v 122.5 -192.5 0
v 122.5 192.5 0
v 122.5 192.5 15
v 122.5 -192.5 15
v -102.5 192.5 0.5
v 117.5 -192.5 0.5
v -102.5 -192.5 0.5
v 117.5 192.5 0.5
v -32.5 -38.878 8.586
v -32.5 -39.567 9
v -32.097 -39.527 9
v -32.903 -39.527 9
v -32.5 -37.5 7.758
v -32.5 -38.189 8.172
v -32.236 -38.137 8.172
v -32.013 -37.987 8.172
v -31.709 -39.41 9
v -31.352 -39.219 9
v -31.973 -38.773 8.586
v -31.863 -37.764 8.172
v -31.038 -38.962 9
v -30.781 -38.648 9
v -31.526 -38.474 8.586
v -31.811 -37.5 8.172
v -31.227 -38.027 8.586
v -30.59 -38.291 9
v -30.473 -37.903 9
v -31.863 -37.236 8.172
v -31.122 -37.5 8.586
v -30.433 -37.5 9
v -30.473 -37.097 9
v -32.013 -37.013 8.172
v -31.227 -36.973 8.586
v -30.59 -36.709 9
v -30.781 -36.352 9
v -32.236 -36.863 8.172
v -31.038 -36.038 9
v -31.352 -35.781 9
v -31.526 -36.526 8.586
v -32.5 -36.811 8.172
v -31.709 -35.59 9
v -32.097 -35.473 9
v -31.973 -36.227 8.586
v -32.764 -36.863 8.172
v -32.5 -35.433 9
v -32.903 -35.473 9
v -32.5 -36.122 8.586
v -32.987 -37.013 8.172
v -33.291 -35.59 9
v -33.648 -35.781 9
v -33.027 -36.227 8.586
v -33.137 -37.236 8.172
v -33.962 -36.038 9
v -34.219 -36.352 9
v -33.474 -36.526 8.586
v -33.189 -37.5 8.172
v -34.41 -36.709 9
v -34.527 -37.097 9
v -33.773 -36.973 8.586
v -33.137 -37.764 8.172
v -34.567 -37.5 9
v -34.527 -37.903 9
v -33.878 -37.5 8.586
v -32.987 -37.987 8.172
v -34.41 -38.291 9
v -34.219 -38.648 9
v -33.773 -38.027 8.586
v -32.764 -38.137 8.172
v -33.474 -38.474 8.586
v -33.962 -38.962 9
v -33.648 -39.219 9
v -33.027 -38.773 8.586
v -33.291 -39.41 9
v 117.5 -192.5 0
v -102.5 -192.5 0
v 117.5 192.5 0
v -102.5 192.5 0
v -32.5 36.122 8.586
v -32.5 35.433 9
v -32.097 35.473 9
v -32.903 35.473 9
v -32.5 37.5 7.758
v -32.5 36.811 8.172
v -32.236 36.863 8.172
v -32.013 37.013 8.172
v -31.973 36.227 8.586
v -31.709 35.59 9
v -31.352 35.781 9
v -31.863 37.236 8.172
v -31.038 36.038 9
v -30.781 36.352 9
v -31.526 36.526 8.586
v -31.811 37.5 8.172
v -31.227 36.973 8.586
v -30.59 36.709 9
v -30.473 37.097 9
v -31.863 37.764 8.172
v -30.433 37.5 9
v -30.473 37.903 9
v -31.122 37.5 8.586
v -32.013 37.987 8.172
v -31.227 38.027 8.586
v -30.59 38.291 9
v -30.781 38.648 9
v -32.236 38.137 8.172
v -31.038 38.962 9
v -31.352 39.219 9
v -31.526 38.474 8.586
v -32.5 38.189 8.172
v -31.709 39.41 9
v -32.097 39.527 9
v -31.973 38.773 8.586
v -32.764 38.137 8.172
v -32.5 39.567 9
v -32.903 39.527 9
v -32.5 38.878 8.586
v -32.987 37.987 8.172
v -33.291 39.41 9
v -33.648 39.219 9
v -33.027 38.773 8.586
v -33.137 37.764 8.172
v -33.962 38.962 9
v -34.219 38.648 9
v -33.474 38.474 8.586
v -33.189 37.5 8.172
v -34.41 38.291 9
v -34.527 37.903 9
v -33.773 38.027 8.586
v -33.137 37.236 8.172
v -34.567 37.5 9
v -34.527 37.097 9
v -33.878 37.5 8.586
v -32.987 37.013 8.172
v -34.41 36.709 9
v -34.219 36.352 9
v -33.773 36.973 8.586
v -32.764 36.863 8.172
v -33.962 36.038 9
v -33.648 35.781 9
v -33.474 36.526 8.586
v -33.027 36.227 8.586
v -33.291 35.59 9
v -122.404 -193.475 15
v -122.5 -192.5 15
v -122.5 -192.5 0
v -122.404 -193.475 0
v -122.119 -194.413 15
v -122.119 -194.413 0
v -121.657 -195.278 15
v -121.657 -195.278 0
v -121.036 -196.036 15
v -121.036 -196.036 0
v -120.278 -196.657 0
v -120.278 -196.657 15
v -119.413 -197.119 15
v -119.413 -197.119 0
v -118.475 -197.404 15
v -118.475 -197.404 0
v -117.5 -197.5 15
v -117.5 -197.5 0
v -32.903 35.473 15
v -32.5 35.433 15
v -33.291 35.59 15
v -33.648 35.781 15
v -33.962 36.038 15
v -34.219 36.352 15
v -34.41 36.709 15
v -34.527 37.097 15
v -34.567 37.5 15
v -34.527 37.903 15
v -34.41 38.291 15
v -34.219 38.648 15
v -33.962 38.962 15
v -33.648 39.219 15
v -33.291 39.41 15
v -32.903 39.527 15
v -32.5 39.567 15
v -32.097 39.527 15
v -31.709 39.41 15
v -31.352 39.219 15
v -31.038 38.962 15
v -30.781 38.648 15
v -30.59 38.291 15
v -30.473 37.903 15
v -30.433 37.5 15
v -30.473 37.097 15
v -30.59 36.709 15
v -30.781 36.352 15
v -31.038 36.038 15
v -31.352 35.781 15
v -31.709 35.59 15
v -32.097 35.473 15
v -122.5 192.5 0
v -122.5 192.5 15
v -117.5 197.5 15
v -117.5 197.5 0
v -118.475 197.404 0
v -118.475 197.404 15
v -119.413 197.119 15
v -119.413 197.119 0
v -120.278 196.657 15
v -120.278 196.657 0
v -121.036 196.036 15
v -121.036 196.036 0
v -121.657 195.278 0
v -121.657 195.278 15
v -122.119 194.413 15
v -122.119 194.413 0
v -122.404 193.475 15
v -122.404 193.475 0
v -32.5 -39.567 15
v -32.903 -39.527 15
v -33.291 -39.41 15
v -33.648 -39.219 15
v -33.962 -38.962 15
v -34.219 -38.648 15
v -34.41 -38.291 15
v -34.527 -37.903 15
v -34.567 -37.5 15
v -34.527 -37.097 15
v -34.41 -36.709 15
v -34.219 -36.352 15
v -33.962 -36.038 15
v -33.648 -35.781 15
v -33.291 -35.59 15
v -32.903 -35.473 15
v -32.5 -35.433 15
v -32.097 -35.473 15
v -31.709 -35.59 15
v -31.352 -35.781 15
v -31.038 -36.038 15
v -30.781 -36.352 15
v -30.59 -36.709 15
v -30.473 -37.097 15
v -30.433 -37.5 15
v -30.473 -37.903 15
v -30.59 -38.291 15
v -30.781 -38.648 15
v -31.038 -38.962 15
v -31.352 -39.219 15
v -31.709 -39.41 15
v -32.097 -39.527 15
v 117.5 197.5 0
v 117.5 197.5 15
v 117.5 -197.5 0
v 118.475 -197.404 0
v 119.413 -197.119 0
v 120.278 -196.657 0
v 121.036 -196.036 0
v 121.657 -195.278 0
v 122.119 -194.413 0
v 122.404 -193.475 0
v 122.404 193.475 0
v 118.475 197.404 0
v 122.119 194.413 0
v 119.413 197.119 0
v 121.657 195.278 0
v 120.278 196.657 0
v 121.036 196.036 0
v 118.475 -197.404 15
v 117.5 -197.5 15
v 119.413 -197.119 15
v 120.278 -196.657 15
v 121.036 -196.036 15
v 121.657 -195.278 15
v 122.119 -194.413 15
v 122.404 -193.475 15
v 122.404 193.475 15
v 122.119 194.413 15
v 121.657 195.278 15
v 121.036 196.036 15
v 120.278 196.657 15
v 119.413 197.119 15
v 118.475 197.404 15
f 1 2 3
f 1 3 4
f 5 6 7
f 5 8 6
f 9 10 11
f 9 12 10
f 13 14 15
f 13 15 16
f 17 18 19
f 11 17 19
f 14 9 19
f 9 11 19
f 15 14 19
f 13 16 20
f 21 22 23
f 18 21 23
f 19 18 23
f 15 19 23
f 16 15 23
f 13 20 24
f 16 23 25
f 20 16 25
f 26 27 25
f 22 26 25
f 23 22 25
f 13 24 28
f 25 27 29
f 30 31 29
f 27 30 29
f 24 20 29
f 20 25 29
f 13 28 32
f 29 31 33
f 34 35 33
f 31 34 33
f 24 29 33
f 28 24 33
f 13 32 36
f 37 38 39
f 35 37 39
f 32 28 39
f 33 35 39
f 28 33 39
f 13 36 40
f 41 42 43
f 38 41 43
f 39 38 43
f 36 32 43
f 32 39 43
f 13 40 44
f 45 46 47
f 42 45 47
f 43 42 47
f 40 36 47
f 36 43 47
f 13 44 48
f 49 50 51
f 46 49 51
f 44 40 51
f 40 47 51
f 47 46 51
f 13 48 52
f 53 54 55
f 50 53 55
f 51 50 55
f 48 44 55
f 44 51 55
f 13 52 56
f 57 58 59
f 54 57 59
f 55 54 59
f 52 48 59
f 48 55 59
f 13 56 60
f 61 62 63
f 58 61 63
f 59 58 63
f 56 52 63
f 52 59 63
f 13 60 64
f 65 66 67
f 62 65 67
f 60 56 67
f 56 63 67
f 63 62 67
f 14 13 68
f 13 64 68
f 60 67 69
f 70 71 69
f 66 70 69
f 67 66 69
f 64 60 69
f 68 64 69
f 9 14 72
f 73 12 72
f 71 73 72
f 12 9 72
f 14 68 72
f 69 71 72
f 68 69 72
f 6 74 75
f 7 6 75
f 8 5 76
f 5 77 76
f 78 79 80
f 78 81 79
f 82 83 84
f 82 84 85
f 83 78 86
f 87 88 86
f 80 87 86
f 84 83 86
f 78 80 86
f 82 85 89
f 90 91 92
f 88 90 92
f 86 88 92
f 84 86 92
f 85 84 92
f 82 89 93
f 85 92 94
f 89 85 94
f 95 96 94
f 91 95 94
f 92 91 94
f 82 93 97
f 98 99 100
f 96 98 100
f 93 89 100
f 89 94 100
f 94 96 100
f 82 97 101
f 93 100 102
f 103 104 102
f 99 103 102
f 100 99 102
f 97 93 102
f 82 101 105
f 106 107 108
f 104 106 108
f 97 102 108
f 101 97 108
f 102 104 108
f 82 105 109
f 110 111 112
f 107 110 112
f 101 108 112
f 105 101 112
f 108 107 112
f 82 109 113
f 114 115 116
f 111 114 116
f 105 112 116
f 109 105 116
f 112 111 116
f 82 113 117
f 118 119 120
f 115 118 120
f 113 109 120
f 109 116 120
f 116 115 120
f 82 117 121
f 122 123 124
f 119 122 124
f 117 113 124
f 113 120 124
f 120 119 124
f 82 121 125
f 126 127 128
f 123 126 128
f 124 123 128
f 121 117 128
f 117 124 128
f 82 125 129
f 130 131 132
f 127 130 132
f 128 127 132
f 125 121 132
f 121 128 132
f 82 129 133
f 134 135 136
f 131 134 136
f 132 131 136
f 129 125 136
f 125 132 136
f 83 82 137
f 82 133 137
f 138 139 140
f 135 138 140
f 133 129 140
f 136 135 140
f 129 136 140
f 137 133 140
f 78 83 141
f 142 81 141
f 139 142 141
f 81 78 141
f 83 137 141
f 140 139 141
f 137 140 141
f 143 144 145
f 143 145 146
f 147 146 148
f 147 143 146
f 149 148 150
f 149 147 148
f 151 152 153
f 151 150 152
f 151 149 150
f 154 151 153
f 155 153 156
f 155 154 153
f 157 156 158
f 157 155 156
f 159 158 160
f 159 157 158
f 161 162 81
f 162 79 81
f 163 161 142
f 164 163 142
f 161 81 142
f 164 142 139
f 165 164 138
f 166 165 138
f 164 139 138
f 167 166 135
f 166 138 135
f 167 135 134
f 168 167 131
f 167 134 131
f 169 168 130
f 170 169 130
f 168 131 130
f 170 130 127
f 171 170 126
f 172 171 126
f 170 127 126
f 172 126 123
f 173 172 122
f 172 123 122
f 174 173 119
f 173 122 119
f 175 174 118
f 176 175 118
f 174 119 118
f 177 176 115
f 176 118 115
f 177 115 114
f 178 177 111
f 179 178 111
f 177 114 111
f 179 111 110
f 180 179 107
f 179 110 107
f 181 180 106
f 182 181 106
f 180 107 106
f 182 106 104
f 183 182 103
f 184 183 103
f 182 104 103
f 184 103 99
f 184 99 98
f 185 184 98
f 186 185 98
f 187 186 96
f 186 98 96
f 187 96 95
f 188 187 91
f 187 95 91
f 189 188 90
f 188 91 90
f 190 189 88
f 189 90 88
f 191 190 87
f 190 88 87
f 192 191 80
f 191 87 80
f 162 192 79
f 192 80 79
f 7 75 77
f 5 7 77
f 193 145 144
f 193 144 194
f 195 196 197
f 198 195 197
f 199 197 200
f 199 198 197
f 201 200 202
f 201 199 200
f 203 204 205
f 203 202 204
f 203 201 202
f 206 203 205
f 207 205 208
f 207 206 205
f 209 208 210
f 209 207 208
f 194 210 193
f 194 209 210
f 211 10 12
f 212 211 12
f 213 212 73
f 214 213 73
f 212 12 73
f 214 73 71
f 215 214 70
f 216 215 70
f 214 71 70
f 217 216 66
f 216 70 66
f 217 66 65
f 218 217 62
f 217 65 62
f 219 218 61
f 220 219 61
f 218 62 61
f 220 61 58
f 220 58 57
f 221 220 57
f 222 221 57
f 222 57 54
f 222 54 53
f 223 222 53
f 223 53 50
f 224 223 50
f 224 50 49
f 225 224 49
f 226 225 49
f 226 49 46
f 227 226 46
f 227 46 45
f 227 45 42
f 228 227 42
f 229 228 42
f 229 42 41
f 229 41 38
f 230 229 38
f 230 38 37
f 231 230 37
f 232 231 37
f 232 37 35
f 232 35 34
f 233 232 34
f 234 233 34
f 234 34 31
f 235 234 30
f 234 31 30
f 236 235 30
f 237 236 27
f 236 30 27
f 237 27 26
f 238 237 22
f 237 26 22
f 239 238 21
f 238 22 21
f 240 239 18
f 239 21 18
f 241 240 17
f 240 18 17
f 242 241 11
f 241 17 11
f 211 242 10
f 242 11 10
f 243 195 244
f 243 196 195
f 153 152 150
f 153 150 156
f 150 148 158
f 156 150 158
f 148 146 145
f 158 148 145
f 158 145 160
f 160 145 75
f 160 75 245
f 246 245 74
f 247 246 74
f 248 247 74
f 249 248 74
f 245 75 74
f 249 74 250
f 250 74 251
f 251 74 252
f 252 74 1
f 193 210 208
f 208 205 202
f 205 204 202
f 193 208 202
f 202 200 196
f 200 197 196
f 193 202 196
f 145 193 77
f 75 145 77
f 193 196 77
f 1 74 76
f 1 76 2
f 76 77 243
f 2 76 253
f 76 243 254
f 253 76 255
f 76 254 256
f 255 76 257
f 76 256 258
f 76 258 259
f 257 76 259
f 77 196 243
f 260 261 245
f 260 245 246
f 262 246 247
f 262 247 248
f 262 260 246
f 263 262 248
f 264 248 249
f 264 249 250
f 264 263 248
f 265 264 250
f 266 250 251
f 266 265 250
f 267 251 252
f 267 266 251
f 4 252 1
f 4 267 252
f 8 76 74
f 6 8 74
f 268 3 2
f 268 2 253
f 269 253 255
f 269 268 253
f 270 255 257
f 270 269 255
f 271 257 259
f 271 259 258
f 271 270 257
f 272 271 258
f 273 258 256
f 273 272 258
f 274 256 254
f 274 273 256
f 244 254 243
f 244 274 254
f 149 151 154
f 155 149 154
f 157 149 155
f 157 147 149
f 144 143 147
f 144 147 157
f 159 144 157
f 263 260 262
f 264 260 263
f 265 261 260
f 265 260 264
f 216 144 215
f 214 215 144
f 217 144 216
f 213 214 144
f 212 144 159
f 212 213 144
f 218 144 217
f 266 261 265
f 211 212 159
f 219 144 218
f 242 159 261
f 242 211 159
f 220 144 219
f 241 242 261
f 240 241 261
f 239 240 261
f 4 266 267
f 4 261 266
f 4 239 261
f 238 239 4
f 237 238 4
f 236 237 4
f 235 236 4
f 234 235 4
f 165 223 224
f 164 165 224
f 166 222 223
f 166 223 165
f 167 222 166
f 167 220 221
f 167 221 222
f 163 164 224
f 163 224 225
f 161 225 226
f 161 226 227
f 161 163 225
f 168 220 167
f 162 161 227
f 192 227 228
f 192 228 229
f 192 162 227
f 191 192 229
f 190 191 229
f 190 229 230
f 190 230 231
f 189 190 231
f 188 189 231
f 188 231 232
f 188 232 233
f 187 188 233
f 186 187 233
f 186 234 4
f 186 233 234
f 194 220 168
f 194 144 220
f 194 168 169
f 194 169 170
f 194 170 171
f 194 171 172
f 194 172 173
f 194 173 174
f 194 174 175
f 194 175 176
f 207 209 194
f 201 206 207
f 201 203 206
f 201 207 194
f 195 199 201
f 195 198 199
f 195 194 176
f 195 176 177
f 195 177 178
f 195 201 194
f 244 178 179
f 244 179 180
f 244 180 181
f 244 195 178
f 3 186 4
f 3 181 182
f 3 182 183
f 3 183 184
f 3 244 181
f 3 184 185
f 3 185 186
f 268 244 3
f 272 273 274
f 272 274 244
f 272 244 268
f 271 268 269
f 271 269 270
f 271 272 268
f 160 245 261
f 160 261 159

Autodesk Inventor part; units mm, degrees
ref_plane "YZ Plane" through (0, 0, 0) normal (1, 0, 0) x (0, 1, 0)
ref_plane "XZ Plane" through (0, 0, 0) normal (0, 1, 0) x (-1, 0, 0)
ref_plane "XY Plane" through (0, 0, 0) normal (0, 0, 1) x (1, 0, 0)
sketch "スケッチ1" plane through (0, 0, 0) normal (0, 0, 1) x (1, 0, 0)
  line L0 (122.5, -197.5) -> (-122.5, -197.5)
  line L1 (-122.5, -197.5) -> (-122.5, 197.5)
  line L2 (-122.5, 197.5) -> (122.5, 197.5)
  line L3 (122.5, 197.5) -> (122.5, -197.5)
  line L4 (122.5, -197.5) -> (-122.5, 197.5) construction
  line L5 (-122.5, -197.5) -> (122.5, 197.5) construction
  point P0 (0, 0)
  dimension "d0" = 245
  dimension "d1" = 395
extrude "押し出し1" add sketch "スケッチ1" along normal blind 15
sketch "スケッチ2" plane through (0, 0, 15) normal (0, 0, 1) x (1, 0, 0)
  line L0 (-122.5, 197.5) -> (-122.5, -197.5) projected
  line L1 (122.5, 197.5) -> (-122.5, 197.5) projected
  point P0 (0, 0)
  point P1 (-32.5, 37.5)
  point P2 (-32.5, -37.5)
  dimension "d4" = 90
  dimension "d5" = 75
  dimension "d6" = 160
hole "穴1" at (-32.5, 37.5, 15) at (-32.5, -37.5, 15) direction (0, 0, -1) diameter 4.134 depth 6 tip angle 118 thread size "M5x0.8" class "6H" standard "ISO Metric profile"
sketch "スケッチ3" plane through (0, 0, 0) normal (0, 0, -1) x (-1, 0, 0)
  line L0 (122.5, -197.5) -> (-122.5, -197.5) projected
  line L1 (122.5, 197.5) -> (122.5, -197.5) projected
  line L2 (-122.5, 197.5) -> (122.5, 197.5) projected
  line L3 (-122.5, -197.5) -> (-122.5, 197.5) projected
  line L4 (102.5, 192.5) -> (-117.5, 192.5)
  line L5 (-117.5, 192.5) -> (-117.5, -192.5)
  line L6 (-117.5, -192.5) -> (102.5, -192.5)
  line L7 (102.5, -192.5) -> (102.5, 192.5)
  point P0 (0, 0)
  dimension "d14" = 5
  dimension "d15" = 5
  dimension "d16" = 5
  dimension "d17" = 20
extrude "押し出し2" cut sketch "スケッチ3" against normal blind 0.5 contours L7 L6 L5 L4
fillet "フィレット1" radius 5 4 edges at (122.5, -197.5, 7.5) (-122.5, -197.5, 7.5) (122.5, 197.5, 7.5) (-122.5, 197.5, 7.5)
properties part number "Display"
